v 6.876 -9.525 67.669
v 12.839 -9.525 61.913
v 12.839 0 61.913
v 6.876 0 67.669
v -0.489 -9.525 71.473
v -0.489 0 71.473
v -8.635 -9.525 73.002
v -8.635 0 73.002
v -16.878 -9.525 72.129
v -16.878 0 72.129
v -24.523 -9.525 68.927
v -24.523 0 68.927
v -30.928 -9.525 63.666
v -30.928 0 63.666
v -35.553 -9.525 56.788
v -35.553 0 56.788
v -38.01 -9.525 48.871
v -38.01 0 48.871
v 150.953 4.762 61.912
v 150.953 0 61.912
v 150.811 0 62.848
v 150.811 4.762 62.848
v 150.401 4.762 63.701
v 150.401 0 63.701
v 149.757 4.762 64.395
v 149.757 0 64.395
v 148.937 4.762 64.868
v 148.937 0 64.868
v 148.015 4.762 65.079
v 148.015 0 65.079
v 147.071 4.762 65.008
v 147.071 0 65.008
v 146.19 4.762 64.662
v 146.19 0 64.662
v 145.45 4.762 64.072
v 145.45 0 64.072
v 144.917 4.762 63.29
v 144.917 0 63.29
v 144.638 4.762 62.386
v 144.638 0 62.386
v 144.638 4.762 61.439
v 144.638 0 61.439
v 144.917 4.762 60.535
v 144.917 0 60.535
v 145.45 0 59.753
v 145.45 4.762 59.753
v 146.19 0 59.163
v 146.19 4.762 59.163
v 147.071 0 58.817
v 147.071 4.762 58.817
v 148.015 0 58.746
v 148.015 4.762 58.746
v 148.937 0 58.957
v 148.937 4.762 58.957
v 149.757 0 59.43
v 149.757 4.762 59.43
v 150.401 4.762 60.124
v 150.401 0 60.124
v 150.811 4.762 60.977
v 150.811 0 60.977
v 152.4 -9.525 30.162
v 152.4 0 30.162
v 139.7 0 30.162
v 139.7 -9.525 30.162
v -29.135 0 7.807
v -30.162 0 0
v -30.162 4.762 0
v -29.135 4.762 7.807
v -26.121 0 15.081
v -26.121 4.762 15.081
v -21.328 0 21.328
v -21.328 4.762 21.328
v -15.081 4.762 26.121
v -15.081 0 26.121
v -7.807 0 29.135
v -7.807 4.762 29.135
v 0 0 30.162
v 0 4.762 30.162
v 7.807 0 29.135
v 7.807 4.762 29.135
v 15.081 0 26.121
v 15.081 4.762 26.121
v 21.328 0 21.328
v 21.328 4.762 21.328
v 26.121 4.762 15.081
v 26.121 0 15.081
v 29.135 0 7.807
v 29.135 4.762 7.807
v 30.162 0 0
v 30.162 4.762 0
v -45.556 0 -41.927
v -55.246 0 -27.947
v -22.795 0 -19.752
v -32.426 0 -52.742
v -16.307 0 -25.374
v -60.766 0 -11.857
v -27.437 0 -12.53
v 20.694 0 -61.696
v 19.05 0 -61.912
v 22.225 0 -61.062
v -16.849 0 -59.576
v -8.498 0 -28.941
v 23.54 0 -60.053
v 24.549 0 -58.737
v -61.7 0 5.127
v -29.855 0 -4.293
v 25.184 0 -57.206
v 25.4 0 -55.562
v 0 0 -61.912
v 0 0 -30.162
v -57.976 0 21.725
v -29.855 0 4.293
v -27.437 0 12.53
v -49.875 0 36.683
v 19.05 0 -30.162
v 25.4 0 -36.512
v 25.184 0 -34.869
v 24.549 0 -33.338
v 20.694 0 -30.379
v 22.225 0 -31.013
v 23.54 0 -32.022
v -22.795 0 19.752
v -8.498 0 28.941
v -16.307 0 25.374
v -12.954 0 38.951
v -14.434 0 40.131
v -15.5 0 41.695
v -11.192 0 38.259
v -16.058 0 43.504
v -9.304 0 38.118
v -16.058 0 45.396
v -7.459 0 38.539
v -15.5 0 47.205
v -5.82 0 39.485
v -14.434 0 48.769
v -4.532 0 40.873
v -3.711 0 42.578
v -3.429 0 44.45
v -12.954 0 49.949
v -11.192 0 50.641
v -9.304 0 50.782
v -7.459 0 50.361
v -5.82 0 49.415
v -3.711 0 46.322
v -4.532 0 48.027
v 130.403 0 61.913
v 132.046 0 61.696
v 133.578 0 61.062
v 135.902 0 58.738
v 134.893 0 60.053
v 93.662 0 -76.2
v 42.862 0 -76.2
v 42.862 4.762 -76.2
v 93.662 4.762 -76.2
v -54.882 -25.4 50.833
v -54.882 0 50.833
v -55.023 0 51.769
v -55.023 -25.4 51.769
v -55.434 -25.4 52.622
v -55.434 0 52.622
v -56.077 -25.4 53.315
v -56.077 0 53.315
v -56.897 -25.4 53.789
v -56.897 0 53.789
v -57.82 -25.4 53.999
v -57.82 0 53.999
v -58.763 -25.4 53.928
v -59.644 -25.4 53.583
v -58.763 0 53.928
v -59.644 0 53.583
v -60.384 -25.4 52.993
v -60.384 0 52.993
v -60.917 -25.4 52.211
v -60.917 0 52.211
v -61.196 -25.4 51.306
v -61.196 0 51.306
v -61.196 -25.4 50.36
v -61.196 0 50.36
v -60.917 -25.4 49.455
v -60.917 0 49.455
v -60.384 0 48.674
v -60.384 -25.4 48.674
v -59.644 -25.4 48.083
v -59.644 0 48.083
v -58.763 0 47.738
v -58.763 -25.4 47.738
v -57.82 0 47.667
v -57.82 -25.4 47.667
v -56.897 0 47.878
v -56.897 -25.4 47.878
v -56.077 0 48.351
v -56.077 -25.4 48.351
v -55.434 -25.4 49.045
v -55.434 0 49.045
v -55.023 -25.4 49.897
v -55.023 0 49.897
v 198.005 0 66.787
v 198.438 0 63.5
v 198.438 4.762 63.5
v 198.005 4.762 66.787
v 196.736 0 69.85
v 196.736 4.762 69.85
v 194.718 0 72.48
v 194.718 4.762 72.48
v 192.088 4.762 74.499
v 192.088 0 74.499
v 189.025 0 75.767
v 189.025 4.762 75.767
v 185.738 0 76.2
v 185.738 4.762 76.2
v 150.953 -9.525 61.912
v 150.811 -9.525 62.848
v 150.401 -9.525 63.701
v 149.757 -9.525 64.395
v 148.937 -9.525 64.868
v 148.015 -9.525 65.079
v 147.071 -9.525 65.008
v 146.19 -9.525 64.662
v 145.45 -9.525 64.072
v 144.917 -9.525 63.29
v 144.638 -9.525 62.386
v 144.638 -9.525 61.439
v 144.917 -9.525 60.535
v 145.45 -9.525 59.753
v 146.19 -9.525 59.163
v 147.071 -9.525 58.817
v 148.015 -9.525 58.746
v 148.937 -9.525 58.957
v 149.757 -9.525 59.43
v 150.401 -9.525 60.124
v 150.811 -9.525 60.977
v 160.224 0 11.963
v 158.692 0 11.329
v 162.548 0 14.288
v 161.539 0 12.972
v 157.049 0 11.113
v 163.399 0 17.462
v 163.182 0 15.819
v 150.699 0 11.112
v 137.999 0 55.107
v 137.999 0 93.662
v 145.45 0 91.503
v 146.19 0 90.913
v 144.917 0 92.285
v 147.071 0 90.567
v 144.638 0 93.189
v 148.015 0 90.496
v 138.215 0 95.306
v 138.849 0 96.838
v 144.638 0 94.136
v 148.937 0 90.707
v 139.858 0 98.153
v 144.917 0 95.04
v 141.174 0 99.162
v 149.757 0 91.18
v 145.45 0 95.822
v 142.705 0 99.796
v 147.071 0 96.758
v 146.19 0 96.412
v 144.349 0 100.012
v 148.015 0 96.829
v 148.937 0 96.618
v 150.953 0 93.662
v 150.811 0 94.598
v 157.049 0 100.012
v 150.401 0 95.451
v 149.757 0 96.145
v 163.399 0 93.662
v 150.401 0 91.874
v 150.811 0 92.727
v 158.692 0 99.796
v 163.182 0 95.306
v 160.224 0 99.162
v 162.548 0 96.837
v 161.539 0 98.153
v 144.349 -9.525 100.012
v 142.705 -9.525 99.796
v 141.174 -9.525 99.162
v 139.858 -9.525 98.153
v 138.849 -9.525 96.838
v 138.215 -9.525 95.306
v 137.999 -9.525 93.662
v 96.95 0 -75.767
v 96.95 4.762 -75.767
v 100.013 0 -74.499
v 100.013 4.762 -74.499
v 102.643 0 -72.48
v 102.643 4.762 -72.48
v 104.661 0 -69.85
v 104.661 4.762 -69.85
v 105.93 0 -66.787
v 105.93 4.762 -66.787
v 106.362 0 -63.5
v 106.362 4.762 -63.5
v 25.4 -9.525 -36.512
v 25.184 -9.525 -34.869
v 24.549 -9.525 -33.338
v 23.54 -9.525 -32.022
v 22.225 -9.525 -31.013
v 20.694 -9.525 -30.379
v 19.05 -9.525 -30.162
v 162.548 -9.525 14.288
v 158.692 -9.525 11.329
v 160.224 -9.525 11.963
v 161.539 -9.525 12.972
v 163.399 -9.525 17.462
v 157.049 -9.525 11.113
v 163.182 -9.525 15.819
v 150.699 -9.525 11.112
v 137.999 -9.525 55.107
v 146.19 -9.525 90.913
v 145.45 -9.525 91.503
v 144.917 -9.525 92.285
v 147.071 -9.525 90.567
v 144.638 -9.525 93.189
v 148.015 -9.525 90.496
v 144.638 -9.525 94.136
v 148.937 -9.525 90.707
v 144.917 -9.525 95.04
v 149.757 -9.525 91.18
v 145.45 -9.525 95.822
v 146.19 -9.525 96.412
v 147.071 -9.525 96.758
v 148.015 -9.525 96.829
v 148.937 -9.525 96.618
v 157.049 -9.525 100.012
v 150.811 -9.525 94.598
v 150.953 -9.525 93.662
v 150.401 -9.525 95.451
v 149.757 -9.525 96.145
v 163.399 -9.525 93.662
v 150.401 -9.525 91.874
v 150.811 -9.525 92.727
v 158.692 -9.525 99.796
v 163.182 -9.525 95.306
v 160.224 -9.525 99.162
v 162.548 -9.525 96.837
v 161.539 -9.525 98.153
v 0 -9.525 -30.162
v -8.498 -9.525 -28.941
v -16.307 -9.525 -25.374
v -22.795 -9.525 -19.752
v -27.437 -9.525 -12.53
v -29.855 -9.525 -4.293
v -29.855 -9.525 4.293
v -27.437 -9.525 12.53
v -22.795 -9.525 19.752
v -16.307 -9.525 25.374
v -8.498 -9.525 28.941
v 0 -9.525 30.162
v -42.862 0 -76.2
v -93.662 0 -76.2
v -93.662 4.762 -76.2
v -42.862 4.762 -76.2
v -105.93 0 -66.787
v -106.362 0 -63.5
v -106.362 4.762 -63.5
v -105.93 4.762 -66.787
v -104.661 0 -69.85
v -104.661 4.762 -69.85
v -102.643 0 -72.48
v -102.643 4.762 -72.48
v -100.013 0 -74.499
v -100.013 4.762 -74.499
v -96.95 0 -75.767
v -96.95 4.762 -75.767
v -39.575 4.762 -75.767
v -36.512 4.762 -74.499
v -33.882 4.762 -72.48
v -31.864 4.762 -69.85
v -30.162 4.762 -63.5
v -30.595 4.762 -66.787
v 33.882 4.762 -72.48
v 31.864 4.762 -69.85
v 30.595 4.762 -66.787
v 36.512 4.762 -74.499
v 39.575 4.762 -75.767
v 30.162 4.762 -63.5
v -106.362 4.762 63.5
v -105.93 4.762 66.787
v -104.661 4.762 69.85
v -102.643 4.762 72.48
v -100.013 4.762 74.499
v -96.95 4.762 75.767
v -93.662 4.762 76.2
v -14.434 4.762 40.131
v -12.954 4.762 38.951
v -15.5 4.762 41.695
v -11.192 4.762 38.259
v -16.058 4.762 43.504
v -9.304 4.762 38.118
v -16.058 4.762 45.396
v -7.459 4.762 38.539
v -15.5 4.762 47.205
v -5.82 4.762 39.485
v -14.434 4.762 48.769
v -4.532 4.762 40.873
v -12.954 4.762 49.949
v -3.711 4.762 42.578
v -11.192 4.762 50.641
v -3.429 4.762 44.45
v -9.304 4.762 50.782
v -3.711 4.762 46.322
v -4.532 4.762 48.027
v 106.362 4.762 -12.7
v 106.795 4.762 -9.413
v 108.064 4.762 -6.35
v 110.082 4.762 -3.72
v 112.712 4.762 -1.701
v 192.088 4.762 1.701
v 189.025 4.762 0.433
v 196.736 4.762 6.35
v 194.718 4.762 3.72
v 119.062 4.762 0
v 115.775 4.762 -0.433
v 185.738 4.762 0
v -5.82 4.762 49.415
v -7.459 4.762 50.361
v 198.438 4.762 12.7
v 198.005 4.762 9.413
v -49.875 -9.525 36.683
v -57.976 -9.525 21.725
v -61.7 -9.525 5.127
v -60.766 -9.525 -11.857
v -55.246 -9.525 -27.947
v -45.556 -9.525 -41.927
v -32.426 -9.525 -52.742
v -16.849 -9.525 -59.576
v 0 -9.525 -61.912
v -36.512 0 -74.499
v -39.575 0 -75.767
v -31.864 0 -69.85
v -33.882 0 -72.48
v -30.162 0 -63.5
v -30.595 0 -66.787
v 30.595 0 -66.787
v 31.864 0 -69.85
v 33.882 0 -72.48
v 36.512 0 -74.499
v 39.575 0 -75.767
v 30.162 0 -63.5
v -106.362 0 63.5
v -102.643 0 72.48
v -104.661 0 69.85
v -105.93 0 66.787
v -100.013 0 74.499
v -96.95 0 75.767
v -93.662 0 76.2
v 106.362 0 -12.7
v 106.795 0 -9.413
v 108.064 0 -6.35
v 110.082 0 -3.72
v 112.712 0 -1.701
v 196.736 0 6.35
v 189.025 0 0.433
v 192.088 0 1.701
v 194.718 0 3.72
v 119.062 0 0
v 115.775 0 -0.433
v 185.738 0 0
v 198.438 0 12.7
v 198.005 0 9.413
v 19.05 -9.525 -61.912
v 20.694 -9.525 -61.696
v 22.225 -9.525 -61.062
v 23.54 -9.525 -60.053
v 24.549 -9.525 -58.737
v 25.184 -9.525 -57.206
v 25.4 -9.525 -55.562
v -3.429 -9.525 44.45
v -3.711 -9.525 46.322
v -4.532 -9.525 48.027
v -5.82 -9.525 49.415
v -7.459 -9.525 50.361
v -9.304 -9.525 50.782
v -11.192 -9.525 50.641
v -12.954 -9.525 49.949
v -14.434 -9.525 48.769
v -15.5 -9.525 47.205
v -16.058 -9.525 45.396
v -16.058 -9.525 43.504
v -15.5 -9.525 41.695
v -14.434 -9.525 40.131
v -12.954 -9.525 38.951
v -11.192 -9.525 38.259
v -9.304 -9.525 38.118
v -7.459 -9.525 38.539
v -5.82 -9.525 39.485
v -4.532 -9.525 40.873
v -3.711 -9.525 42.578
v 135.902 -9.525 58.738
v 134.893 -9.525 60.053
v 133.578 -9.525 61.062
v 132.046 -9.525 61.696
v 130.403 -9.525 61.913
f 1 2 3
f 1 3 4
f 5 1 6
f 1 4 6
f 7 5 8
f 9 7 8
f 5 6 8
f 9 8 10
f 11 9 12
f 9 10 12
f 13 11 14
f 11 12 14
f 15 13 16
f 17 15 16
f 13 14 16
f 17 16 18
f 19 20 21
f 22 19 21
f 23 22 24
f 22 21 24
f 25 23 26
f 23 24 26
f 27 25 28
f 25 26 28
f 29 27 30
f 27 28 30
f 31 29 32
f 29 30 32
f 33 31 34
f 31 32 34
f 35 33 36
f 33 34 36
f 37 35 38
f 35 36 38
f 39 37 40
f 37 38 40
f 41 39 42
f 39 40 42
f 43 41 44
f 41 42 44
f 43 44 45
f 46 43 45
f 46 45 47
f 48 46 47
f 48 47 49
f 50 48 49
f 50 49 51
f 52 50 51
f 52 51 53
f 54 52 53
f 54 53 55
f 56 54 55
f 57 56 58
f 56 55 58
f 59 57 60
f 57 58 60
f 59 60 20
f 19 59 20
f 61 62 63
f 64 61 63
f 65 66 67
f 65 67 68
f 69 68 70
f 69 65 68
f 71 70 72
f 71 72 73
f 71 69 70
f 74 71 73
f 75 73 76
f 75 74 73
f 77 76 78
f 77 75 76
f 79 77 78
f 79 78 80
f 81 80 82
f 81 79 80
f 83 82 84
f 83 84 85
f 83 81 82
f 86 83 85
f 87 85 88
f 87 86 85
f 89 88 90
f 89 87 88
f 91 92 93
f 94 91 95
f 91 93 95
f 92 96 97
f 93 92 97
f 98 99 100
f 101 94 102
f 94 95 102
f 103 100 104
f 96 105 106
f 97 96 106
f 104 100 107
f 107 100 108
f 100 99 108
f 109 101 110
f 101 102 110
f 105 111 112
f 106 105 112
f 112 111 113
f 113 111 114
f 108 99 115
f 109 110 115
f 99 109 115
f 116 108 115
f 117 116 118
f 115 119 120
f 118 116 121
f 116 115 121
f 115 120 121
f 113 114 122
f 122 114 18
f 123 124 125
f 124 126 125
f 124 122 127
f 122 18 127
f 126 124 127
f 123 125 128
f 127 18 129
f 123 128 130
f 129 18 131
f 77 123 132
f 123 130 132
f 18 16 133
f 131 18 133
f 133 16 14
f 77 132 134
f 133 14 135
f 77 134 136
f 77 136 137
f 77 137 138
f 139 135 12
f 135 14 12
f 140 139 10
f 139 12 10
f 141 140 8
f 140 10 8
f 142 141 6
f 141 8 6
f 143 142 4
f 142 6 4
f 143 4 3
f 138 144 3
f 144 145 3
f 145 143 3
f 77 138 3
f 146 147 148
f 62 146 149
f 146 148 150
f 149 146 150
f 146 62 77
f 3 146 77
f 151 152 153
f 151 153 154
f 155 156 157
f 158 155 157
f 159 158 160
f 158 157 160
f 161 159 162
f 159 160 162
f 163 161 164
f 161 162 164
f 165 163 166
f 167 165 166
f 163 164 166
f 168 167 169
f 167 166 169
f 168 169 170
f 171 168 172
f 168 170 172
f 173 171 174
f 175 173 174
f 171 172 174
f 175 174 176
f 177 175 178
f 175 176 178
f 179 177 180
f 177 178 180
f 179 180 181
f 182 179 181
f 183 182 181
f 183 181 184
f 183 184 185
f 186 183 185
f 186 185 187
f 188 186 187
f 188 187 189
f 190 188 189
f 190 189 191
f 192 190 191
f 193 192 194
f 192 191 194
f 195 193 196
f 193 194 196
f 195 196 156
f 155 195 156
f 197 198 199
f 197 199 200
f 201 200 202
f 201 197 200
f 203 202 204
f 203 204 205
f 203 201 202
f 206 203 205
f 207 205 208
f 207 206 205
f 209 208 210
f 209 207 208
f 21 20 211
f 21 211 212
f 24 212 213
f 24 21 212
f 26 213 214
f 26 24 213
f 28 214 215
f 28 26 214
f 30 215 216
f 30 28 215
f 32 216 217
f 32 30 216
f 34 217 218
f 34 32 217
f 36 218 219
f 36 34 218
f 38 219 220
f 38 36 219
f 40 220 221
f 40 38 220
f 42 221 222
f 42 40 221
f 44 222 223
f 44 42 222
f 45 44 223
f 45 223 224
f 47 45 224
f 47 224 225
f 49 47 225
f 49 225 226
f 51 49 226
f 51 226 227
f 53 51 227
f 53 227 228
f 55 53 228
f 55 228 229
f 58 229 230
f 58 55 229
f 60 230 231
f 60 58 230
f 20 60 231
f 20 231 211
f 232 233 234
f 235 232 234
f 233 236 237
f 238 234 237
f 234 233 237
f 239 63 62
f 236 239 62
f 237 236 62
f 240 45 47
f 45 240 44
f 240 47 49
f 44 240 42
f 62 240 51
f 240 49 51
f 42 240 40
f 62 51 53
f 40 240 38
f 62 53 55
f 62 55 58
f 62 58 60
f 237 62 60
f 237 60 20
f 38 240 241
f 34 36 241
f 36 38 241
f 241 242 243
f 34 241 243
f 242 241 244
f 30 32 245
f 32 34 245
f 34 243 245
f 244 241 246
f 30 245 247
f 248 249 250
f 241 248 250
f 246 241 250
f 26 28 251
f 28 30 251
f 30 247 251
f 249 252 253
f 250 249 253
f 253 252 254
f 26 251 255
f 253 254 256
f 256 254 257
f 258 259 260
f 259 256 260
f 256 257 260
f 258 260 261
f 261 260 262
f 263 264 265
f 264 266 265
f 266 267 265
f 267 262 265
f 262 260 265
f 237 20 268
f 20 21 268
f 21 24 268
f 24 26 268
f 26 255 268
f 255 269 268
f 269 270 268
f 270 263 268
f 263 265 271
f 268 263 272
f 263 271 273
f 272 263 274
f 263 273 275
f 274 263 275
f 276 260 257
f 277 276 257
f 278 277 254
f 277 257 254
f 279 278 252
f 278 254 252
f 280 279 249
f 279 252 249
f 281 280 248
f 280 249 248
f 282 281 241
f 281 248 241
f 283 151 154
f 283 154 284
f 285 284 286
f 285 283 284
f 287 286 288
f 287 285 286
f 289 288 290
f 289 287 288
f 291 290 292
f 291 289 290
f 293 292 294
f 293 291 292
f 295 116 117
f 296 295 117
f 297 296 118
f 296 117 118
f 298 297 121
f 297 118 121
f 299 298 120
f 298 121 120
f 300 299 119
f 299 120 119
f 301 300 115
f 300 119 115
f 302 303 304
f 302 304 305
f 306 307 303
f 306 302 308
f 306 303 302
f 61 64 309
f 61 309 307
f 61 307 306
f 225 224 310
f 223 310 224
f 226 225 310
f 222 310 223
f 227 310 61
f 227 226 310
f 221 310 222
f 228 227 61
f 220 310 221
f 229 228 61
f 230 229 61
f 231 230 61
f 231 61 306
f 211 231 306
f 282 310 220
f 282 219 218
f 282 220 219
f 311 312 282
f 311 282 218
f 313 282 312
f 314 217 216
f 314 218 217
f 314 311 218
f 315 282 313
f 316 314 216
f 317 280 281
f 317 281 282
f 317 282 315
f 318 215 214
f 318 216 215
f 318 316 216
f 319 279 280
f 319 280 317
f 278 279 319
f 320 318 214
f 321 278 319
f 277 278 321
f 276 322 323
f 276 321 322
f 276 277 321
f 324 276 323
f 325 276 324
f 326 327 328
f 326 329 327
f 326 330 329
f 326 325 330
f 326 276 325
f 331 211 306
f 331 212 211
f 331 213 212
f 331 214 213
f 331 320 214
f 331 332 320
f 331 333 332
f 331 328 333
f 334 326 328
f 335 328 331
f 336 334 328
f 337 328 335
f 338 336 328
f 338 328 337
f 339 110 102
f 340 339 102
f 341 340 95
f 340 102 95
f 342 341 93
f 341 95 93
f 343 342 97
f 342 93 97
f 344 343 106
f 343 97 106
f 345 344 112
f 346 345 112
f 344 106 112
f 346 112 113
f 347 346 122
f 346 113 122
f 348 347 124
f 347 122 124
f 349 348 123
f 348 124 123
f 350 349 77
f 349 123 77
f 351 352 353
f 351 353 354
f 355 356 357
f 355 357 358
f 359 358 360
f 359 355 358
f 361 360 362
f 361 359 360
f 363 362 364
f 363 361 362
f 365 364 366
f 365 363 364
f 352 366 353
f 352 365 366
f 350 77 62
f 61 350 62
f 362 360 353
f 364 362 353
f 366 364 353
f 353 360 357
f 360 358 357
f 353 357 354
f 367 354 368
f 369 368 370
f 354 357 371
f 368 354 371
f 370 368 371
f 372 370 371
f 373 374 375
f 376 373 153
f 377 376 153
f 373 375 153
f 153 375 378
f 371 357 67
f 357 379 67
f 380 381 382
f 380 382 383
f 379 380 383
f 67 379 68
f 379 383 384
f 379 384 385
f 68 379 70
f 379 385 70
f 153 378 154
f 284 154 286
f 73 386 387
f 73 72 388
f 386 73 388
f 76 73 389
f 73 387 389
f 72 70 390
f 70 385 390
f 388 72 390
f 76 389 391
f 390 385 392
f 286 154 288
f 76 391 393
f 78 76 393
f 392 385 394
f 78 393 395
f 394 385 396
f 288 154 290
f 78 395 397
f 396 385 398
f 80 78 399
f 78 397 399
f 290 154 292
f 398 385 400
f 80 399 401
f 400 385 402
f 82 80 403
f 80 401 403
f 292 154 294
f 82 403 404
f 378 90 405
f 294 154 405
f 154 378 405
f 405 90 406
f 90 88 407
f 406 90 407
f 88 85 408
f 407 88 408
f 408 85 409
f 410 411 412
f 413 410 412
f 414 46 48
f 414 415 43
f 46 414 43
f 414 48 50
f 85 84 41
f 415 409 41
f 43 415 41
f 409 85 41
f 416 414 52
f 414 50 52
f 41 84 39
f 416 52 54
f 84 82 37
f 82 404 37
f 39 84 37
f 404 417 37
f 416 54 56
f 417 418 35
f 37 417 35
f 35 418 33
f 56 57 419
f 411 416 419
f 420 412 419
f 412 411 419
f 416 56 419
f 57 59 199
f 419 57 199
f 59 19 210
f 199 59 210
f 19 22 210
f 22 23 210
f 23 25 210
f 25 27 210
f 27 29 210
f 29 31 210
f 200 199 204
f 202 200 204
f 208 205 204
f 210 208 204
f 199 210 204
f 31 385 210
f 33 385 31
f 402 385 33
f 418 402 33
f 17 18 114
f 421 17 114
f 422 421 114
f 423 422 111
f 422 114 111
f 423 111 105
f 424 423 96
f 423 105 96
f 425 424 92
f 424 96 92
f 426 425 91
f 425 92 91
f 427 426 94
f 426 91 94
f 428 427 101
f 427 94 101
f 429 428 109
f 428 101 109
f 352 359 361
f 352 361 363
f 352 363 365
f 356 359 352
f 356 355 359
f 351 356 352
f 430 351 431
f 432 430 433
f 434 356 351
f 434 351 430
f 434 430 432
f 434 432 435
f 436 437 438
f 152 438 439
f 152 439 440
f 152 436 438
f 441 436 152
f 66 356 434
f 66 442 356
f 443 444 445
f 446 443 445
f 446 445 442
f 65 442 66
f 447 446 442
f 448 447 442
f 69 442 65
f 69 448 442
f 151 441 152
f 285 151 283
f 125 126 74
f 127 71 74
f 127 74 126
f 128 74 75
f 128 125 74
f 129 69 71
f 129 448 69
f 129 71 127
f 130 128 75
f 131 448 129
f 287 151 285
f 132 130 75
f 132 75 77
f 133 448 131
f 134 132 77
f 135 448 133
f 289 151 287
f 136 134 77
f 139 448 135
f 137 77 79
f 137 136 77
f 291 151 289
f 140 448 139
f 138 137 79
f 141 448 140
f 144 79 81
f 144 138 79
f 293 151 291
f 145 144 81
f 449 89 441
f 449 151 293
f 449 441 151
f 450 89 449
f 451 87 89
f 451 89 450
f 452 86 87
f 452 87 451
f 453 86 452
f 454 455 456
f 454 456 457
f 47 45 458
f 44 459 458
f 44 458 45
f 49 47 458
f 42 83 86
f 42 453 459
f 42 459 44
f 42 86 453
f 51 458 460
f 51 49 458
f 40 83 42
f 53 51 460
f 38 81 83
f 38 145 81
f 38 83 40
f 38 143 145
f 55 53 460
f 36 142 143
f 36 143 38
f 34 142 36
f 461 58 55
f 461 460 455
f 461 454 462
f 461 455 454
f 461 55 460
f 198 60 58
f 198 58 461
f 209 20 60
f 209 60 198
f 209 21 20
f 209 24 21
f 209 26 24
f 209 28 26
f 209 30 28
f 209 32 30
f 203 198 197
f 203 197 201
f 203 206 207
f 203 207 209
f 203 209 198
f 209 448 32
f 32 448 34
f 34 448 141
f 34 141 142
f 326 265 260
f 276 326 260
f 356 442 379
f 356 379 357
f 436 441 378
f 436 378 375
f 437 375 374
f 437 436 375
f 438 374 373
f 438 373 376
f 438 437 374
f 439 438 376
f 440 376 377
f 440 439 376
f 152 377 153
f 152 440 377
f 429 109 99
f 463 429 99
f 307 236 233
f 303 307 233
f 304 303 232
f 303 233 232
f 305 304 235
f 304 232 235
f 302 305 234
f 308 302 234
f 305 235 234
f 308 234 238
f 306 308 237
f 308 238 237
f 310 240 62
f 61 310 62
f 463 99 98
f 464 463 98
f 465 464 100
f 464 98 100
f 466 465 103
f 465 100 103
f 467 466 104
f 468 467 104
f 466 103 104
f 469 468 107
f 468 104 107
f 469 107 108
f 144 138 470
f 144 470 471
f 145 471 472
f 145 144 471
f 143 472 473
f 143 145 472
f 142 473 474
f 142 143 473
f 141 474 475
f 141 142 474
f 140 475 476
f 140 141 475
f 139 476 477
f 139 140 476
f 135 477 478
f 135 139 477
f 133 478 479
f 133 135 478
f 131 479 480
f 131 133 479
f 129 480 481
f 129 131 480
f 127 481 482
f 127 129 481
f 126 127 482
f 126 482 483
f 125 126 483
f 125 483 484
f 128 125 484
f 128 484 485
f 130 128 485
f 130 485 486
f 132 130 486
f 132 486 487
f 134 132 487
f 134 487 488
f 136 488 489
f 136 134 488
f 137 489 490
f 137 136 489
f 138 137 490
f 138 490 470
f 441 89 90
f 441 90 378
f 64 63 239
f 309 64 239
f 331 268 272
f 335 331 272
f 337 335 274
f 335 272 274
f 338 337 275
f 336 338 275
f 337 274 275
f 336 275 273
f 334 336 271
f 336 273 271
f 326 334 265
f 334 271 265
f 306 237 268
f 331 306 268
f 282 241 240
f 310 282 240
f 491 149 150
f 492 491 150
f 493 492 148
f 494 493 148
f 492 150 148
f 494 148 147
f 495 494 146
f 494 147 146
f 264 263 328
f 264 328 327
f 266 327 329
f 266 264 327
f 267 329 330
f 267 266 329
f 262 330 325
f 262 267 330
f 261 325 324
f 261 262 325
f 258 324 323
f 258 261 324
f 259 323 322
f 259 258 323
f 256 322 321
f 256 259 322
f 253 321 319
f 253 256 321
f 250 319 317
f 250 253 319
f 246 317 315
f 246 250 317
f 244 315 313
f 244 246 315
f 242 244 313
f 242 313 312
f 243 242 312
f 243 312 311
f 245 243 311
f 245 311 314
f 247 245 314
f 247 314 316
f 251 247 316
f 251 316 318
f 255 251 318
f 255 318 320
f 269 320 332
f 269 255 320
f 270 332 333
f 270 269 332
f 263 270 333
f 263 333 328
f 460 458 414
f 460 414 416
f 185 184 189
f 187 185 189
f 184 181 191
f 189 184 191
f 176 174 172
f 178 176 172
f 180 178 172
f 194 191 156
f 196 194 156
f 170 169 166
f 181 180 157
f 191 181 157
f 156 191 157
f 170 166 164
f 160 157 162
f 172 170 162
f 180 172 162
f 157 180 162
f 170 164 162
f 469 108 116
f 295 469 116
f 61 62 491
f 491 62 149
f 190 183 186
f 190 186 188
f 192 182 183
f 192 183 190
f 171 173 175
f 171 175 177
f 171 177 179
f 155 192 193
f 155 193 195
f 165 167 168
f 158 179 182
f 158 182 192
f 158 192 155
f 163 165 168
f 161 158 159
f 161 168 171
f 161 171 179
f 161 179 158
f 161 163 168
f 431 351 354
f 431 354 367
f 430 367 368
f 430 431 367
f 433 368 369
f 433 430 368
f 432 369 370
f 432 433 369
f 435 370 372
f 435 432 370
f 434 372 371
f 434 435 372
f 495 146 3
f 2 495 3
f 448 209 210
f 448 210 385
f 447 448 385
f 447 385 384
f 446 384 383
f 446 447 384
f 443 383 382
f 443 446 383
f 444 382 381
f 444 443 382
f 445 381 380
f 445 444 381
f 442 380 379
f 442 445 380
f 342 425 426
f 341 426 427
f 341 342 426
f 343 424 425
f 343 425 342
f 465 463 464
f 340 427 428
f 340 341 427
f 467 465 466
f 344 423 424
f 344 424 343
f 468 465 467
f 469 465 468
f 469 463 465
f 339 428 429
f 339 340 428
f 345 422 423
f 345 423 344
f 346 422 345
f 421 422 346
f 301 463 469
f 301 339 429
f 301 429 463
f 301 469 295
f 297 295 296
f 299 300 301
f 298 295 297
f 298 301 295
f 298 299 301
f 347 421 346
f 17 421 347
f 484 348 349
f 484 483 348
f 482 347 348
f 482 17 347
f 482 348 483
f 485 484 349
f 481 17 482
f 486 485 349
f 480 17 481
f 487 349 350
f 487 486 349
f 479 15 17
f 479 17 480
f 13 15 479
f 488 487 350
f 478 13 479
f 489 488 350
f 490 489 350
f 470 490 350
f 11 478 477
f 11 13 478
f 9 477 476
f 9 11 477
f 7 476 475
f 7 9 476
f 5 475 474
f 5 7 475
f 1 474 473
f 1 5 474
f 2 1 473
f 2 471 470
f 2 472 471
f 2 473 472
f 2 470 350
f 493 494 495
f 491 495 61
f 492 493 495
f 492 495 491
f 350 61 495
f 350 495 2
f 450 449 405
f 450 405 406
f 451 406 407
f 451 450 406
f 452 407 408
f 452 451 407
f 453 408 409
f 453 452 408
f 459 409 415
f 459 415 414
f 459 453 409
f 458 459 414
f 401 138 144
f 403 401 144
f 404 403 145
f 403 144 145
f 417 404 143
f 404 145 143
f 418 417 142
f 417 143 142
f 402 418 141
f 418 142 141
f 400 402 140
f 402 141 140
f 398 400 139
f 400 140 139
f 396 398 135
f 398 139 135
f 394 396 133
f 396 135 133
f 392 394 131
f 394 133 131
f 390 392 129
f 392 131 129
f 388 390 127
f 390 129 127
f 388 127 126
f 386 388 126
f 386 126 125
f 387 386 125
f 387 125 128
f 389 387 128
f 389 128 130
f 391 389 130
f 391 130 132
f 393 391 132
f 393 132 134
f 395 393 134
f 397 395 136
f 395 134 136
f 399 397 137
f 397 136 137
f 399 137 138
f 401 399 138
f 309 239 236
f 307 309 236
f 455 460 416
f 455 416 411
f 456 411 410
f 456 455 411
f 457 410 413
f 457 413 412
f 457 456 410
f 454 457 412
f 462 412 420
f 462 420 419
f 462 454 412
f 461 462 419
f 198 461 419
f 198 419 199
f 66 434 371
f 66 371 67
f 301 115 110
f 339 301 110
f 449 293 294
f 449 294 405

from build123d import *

# Parameters (mm, degrees)
F0_R     = 6.35
F2_DEPTH = 9.525
F1_R     = 3.175
F3_R     = 3.175
F4_DEPTH = 25.4
F5_R     = 3.175
F5_R_2   = 6.35
F6_DEPTH = 4.7625


with BuildPart() as f2:
    # F0 (on Front) → F2 (new body)
    with BuildSketch(Plane.XZ):
        with BuildLine():
            ThreePointArc((0, -30.1625), (-30.1625, 0), (0, 30.1625))
            Line((0, 30.1625), (152.4, 30.1625))
            Line((152.4, 30.1625), (135.9022160579, 58.7375))
            ThreePointArc((135.9022160579, 58.7375), (133.5779547439, 61.061761314), (130.4029547439, 61.9125))
            Line((130.4029547439, 61.9125), (12.8393933724, 61.9125))
            ThreePointArc((12.8393933724, 61.9125), (-16.8778047521, 72.129190669), (-38.0098779856, 48.8713293432))
            ThreePointArc((-38.0098779856, 48.8713293432), (-58.5615224965, -20.0924298965), (0, -61.9125))
            Line((0, -61.9125), (19.05, -61.9125))
            ThreePointArc((19.05, -61.9125), (23.5401280605, -60.0526280605), (25.4, -55.5625))
            Line((25.4, -55.5625), (25.4, -36.5125))
            ThreePointArc((25.4, -36.5125), (23.5401280605, -32.0223719395), (19.05, -30.1625))
            Line((19.05, -30.1625), (0, -30.1625))
        make_face()
        with Locations((-9.779, 44.45)):
            Circle(F0_R, mode=Mode.SUBTRACT)
    extrude(amount=F2_DEPTH)


with BuildPart() as f2b:
    # F1 (on Front) → F2, piece 2 (new body)
    with BuildSketch(Plane.XZ):
        with BuildLine():
            Line((137.9985226281, 55.1065905122), (152.4, 30.1625))
            Line((152.4, 30.1625), (139.7, 30.1625))
            Line((139.7, 30.1625), (150.6985226281, 11.1125))
            Line((150.6985226281, 11.1125), (157.0485226281, 11.1125))
            ThreePointArc((157.0485226281, 11.1125), (161.5386506886, 12.9723719395), (163.3985226281, 17.4625))
            Line((163.3985226281, 17.4625), (163.3985226281, 93.6625))
            ThreePointArc((163.3985226281, 93.6625), (161.5386506886, 98.1526280605), (157.0485226281, 100.0125))
            Line((157.0485226281, 100.0125), (144.3485226281, 100.0125))
            ThreePointArc((144.3485226281, 100.0125), (139.8583945675, 98.1526280605), (137.9985226281, 93.6625))
            Line((137.9985226281, 93.6625), (137.9985226281, 55.1065905122))
        make_face()
        with Locations((147.7775226281, 61.9125)):
            Circle(F1_R, mode=Mode.SUBTRACT)
        with Locations((147.7775226281, 93.6625)):
            Circle(F1_R, mode=Mode.SUBTRACT)
    extrude(amount=F2_DEPTH)


with BuildPart() as f4:
    # F3 (on Front) → F4 (new body)
    with BuildSketch(Plane.XZ):
        with Locations((-58.0568350852, 50.8330799639)):
            Circle(F3_R)
    extrude(amount=F4_DEPTH)


with BuildPart() as f6:
    # F5 (on face) → F6 (new body)
    with BuildSketch(Plane.XZ):
        with BuildLine():
            ThreePointArc((0, 30.1625), (21.3281082875, 21.3281082875), (30.1625, 0))
            Line((30.1625, 0), (30.1625, -63.5))
            ThreePointArc((30.1625, -63.5), (33.8822438789, -72.4802561211), (42.8625, -76.2))
            Line((42.8625, -76.2), (93.6625, -76.2))
            ThreePointArc((93.6625, -76.2), (102.6427561211, -72.4802561211), (106.3625, -63.5))
            Line((106.3625, -63.5), (106.3625, -12.7))
            ThreePointArc((106.3625, -12.7), (110.0822438789, -3.7197438789), (119.0625, 0))
            Line((119.0625, 0), (185.7375, 0))
            ThreePointArc((185.7375, 0), (194.7177561211, 3.7197438789), (198.4375, 12.7))
            Line((198.4375, 12.7), (198.4375, 63.5))
            ThreePointArc((198.4375, 63.5), (194.7177561211, 72.4802561211), (185.7375, 76.2))
            Line((185.7375, 76.2), (-93.6625, 76.2))
            ThreePointArc((-93.6625, 76.2), (-102.6427561211, 72.4802561211), (-106.3625, 63.5))
            Line((-106.3625, 63.5), (-106.3625, -63.5))
            ThreePointArc((-106.3625, -63.5), (-102.6427561211, -72.4802561211), (-93.6625, -76.2))
            Line((-93.6625, -76.2), (-42.8625, -76.2))
            ThreePointArc((-42.8625, -76.2), (-33.8822438789, -72.4802561211), (-30.1625, -63.5))
            Line((-30.1625, -63.5), (-30.1625, -54.0683017118))
            ThreePointArc((-30.1625, -54.0683017118), (-61.7333798725, -4.7061094083), (-38.0098779856, 48.8713293432))
            ThreePointArc((-38.0098779856, 48.8713293432), (-16.8778047521, 72.129190669), (12.8393933724, 61.9125))
            Line((12.8393933724, 61.9125), (130.4029547439, 61.9125))
            ThreePointArc((130.4029547439, 61.9125), (133.5779547439, 61.061761314), (135.9022160579, 58.7375))
            Line((135.9022160579, 58.7375), (152.4, 30.1625))
            Line((152.4, 30.1625), (0, 30.1625))
        make_face()
        with Locations((147.7775226281, 61.9125)):
            Circle(F5_R, mode=Mode.SUBTRACT)
        with BuildLine():
            ThreePointArc((-30.1625, 0), (-21.3281082875, 21.3281082875), (0, 30.1625))
            Line((0, 30.1625), (152.4, 30.1625))
            Line((152.4, 30.1625), (135.9022160579, 58.7375))
            ThreePointArc((135.9022160579, 58.7375), (133.5779547439, 61.061761314), (130.4029547439, 61.9125))
            Line((130.4029547439, 61.9125), (12.8393933724, 61.9125))
            ThreePointArc((12.8393933724, 61.9125), (-16.8778047521, 72.129190669), (-38.0098779856, 48.8713293432))
            ThreePointArc((-38.0098779856, 48.8713293432), (-61.7333798725, -4.7061094083), (-30.1625, -54.0683017118))
            Line((-30.1625, -54.0683017118), (-30.1625, 0))
        make_face()
        with Locations((-9.779, 44.45)):
            Circle(F5_R_2, mode=Mode.SUBTRACT)
    extrude(amount=-F6_DEPTH)


solid = Compound([f2.part, f2b.part, f4.part, f6.part])
